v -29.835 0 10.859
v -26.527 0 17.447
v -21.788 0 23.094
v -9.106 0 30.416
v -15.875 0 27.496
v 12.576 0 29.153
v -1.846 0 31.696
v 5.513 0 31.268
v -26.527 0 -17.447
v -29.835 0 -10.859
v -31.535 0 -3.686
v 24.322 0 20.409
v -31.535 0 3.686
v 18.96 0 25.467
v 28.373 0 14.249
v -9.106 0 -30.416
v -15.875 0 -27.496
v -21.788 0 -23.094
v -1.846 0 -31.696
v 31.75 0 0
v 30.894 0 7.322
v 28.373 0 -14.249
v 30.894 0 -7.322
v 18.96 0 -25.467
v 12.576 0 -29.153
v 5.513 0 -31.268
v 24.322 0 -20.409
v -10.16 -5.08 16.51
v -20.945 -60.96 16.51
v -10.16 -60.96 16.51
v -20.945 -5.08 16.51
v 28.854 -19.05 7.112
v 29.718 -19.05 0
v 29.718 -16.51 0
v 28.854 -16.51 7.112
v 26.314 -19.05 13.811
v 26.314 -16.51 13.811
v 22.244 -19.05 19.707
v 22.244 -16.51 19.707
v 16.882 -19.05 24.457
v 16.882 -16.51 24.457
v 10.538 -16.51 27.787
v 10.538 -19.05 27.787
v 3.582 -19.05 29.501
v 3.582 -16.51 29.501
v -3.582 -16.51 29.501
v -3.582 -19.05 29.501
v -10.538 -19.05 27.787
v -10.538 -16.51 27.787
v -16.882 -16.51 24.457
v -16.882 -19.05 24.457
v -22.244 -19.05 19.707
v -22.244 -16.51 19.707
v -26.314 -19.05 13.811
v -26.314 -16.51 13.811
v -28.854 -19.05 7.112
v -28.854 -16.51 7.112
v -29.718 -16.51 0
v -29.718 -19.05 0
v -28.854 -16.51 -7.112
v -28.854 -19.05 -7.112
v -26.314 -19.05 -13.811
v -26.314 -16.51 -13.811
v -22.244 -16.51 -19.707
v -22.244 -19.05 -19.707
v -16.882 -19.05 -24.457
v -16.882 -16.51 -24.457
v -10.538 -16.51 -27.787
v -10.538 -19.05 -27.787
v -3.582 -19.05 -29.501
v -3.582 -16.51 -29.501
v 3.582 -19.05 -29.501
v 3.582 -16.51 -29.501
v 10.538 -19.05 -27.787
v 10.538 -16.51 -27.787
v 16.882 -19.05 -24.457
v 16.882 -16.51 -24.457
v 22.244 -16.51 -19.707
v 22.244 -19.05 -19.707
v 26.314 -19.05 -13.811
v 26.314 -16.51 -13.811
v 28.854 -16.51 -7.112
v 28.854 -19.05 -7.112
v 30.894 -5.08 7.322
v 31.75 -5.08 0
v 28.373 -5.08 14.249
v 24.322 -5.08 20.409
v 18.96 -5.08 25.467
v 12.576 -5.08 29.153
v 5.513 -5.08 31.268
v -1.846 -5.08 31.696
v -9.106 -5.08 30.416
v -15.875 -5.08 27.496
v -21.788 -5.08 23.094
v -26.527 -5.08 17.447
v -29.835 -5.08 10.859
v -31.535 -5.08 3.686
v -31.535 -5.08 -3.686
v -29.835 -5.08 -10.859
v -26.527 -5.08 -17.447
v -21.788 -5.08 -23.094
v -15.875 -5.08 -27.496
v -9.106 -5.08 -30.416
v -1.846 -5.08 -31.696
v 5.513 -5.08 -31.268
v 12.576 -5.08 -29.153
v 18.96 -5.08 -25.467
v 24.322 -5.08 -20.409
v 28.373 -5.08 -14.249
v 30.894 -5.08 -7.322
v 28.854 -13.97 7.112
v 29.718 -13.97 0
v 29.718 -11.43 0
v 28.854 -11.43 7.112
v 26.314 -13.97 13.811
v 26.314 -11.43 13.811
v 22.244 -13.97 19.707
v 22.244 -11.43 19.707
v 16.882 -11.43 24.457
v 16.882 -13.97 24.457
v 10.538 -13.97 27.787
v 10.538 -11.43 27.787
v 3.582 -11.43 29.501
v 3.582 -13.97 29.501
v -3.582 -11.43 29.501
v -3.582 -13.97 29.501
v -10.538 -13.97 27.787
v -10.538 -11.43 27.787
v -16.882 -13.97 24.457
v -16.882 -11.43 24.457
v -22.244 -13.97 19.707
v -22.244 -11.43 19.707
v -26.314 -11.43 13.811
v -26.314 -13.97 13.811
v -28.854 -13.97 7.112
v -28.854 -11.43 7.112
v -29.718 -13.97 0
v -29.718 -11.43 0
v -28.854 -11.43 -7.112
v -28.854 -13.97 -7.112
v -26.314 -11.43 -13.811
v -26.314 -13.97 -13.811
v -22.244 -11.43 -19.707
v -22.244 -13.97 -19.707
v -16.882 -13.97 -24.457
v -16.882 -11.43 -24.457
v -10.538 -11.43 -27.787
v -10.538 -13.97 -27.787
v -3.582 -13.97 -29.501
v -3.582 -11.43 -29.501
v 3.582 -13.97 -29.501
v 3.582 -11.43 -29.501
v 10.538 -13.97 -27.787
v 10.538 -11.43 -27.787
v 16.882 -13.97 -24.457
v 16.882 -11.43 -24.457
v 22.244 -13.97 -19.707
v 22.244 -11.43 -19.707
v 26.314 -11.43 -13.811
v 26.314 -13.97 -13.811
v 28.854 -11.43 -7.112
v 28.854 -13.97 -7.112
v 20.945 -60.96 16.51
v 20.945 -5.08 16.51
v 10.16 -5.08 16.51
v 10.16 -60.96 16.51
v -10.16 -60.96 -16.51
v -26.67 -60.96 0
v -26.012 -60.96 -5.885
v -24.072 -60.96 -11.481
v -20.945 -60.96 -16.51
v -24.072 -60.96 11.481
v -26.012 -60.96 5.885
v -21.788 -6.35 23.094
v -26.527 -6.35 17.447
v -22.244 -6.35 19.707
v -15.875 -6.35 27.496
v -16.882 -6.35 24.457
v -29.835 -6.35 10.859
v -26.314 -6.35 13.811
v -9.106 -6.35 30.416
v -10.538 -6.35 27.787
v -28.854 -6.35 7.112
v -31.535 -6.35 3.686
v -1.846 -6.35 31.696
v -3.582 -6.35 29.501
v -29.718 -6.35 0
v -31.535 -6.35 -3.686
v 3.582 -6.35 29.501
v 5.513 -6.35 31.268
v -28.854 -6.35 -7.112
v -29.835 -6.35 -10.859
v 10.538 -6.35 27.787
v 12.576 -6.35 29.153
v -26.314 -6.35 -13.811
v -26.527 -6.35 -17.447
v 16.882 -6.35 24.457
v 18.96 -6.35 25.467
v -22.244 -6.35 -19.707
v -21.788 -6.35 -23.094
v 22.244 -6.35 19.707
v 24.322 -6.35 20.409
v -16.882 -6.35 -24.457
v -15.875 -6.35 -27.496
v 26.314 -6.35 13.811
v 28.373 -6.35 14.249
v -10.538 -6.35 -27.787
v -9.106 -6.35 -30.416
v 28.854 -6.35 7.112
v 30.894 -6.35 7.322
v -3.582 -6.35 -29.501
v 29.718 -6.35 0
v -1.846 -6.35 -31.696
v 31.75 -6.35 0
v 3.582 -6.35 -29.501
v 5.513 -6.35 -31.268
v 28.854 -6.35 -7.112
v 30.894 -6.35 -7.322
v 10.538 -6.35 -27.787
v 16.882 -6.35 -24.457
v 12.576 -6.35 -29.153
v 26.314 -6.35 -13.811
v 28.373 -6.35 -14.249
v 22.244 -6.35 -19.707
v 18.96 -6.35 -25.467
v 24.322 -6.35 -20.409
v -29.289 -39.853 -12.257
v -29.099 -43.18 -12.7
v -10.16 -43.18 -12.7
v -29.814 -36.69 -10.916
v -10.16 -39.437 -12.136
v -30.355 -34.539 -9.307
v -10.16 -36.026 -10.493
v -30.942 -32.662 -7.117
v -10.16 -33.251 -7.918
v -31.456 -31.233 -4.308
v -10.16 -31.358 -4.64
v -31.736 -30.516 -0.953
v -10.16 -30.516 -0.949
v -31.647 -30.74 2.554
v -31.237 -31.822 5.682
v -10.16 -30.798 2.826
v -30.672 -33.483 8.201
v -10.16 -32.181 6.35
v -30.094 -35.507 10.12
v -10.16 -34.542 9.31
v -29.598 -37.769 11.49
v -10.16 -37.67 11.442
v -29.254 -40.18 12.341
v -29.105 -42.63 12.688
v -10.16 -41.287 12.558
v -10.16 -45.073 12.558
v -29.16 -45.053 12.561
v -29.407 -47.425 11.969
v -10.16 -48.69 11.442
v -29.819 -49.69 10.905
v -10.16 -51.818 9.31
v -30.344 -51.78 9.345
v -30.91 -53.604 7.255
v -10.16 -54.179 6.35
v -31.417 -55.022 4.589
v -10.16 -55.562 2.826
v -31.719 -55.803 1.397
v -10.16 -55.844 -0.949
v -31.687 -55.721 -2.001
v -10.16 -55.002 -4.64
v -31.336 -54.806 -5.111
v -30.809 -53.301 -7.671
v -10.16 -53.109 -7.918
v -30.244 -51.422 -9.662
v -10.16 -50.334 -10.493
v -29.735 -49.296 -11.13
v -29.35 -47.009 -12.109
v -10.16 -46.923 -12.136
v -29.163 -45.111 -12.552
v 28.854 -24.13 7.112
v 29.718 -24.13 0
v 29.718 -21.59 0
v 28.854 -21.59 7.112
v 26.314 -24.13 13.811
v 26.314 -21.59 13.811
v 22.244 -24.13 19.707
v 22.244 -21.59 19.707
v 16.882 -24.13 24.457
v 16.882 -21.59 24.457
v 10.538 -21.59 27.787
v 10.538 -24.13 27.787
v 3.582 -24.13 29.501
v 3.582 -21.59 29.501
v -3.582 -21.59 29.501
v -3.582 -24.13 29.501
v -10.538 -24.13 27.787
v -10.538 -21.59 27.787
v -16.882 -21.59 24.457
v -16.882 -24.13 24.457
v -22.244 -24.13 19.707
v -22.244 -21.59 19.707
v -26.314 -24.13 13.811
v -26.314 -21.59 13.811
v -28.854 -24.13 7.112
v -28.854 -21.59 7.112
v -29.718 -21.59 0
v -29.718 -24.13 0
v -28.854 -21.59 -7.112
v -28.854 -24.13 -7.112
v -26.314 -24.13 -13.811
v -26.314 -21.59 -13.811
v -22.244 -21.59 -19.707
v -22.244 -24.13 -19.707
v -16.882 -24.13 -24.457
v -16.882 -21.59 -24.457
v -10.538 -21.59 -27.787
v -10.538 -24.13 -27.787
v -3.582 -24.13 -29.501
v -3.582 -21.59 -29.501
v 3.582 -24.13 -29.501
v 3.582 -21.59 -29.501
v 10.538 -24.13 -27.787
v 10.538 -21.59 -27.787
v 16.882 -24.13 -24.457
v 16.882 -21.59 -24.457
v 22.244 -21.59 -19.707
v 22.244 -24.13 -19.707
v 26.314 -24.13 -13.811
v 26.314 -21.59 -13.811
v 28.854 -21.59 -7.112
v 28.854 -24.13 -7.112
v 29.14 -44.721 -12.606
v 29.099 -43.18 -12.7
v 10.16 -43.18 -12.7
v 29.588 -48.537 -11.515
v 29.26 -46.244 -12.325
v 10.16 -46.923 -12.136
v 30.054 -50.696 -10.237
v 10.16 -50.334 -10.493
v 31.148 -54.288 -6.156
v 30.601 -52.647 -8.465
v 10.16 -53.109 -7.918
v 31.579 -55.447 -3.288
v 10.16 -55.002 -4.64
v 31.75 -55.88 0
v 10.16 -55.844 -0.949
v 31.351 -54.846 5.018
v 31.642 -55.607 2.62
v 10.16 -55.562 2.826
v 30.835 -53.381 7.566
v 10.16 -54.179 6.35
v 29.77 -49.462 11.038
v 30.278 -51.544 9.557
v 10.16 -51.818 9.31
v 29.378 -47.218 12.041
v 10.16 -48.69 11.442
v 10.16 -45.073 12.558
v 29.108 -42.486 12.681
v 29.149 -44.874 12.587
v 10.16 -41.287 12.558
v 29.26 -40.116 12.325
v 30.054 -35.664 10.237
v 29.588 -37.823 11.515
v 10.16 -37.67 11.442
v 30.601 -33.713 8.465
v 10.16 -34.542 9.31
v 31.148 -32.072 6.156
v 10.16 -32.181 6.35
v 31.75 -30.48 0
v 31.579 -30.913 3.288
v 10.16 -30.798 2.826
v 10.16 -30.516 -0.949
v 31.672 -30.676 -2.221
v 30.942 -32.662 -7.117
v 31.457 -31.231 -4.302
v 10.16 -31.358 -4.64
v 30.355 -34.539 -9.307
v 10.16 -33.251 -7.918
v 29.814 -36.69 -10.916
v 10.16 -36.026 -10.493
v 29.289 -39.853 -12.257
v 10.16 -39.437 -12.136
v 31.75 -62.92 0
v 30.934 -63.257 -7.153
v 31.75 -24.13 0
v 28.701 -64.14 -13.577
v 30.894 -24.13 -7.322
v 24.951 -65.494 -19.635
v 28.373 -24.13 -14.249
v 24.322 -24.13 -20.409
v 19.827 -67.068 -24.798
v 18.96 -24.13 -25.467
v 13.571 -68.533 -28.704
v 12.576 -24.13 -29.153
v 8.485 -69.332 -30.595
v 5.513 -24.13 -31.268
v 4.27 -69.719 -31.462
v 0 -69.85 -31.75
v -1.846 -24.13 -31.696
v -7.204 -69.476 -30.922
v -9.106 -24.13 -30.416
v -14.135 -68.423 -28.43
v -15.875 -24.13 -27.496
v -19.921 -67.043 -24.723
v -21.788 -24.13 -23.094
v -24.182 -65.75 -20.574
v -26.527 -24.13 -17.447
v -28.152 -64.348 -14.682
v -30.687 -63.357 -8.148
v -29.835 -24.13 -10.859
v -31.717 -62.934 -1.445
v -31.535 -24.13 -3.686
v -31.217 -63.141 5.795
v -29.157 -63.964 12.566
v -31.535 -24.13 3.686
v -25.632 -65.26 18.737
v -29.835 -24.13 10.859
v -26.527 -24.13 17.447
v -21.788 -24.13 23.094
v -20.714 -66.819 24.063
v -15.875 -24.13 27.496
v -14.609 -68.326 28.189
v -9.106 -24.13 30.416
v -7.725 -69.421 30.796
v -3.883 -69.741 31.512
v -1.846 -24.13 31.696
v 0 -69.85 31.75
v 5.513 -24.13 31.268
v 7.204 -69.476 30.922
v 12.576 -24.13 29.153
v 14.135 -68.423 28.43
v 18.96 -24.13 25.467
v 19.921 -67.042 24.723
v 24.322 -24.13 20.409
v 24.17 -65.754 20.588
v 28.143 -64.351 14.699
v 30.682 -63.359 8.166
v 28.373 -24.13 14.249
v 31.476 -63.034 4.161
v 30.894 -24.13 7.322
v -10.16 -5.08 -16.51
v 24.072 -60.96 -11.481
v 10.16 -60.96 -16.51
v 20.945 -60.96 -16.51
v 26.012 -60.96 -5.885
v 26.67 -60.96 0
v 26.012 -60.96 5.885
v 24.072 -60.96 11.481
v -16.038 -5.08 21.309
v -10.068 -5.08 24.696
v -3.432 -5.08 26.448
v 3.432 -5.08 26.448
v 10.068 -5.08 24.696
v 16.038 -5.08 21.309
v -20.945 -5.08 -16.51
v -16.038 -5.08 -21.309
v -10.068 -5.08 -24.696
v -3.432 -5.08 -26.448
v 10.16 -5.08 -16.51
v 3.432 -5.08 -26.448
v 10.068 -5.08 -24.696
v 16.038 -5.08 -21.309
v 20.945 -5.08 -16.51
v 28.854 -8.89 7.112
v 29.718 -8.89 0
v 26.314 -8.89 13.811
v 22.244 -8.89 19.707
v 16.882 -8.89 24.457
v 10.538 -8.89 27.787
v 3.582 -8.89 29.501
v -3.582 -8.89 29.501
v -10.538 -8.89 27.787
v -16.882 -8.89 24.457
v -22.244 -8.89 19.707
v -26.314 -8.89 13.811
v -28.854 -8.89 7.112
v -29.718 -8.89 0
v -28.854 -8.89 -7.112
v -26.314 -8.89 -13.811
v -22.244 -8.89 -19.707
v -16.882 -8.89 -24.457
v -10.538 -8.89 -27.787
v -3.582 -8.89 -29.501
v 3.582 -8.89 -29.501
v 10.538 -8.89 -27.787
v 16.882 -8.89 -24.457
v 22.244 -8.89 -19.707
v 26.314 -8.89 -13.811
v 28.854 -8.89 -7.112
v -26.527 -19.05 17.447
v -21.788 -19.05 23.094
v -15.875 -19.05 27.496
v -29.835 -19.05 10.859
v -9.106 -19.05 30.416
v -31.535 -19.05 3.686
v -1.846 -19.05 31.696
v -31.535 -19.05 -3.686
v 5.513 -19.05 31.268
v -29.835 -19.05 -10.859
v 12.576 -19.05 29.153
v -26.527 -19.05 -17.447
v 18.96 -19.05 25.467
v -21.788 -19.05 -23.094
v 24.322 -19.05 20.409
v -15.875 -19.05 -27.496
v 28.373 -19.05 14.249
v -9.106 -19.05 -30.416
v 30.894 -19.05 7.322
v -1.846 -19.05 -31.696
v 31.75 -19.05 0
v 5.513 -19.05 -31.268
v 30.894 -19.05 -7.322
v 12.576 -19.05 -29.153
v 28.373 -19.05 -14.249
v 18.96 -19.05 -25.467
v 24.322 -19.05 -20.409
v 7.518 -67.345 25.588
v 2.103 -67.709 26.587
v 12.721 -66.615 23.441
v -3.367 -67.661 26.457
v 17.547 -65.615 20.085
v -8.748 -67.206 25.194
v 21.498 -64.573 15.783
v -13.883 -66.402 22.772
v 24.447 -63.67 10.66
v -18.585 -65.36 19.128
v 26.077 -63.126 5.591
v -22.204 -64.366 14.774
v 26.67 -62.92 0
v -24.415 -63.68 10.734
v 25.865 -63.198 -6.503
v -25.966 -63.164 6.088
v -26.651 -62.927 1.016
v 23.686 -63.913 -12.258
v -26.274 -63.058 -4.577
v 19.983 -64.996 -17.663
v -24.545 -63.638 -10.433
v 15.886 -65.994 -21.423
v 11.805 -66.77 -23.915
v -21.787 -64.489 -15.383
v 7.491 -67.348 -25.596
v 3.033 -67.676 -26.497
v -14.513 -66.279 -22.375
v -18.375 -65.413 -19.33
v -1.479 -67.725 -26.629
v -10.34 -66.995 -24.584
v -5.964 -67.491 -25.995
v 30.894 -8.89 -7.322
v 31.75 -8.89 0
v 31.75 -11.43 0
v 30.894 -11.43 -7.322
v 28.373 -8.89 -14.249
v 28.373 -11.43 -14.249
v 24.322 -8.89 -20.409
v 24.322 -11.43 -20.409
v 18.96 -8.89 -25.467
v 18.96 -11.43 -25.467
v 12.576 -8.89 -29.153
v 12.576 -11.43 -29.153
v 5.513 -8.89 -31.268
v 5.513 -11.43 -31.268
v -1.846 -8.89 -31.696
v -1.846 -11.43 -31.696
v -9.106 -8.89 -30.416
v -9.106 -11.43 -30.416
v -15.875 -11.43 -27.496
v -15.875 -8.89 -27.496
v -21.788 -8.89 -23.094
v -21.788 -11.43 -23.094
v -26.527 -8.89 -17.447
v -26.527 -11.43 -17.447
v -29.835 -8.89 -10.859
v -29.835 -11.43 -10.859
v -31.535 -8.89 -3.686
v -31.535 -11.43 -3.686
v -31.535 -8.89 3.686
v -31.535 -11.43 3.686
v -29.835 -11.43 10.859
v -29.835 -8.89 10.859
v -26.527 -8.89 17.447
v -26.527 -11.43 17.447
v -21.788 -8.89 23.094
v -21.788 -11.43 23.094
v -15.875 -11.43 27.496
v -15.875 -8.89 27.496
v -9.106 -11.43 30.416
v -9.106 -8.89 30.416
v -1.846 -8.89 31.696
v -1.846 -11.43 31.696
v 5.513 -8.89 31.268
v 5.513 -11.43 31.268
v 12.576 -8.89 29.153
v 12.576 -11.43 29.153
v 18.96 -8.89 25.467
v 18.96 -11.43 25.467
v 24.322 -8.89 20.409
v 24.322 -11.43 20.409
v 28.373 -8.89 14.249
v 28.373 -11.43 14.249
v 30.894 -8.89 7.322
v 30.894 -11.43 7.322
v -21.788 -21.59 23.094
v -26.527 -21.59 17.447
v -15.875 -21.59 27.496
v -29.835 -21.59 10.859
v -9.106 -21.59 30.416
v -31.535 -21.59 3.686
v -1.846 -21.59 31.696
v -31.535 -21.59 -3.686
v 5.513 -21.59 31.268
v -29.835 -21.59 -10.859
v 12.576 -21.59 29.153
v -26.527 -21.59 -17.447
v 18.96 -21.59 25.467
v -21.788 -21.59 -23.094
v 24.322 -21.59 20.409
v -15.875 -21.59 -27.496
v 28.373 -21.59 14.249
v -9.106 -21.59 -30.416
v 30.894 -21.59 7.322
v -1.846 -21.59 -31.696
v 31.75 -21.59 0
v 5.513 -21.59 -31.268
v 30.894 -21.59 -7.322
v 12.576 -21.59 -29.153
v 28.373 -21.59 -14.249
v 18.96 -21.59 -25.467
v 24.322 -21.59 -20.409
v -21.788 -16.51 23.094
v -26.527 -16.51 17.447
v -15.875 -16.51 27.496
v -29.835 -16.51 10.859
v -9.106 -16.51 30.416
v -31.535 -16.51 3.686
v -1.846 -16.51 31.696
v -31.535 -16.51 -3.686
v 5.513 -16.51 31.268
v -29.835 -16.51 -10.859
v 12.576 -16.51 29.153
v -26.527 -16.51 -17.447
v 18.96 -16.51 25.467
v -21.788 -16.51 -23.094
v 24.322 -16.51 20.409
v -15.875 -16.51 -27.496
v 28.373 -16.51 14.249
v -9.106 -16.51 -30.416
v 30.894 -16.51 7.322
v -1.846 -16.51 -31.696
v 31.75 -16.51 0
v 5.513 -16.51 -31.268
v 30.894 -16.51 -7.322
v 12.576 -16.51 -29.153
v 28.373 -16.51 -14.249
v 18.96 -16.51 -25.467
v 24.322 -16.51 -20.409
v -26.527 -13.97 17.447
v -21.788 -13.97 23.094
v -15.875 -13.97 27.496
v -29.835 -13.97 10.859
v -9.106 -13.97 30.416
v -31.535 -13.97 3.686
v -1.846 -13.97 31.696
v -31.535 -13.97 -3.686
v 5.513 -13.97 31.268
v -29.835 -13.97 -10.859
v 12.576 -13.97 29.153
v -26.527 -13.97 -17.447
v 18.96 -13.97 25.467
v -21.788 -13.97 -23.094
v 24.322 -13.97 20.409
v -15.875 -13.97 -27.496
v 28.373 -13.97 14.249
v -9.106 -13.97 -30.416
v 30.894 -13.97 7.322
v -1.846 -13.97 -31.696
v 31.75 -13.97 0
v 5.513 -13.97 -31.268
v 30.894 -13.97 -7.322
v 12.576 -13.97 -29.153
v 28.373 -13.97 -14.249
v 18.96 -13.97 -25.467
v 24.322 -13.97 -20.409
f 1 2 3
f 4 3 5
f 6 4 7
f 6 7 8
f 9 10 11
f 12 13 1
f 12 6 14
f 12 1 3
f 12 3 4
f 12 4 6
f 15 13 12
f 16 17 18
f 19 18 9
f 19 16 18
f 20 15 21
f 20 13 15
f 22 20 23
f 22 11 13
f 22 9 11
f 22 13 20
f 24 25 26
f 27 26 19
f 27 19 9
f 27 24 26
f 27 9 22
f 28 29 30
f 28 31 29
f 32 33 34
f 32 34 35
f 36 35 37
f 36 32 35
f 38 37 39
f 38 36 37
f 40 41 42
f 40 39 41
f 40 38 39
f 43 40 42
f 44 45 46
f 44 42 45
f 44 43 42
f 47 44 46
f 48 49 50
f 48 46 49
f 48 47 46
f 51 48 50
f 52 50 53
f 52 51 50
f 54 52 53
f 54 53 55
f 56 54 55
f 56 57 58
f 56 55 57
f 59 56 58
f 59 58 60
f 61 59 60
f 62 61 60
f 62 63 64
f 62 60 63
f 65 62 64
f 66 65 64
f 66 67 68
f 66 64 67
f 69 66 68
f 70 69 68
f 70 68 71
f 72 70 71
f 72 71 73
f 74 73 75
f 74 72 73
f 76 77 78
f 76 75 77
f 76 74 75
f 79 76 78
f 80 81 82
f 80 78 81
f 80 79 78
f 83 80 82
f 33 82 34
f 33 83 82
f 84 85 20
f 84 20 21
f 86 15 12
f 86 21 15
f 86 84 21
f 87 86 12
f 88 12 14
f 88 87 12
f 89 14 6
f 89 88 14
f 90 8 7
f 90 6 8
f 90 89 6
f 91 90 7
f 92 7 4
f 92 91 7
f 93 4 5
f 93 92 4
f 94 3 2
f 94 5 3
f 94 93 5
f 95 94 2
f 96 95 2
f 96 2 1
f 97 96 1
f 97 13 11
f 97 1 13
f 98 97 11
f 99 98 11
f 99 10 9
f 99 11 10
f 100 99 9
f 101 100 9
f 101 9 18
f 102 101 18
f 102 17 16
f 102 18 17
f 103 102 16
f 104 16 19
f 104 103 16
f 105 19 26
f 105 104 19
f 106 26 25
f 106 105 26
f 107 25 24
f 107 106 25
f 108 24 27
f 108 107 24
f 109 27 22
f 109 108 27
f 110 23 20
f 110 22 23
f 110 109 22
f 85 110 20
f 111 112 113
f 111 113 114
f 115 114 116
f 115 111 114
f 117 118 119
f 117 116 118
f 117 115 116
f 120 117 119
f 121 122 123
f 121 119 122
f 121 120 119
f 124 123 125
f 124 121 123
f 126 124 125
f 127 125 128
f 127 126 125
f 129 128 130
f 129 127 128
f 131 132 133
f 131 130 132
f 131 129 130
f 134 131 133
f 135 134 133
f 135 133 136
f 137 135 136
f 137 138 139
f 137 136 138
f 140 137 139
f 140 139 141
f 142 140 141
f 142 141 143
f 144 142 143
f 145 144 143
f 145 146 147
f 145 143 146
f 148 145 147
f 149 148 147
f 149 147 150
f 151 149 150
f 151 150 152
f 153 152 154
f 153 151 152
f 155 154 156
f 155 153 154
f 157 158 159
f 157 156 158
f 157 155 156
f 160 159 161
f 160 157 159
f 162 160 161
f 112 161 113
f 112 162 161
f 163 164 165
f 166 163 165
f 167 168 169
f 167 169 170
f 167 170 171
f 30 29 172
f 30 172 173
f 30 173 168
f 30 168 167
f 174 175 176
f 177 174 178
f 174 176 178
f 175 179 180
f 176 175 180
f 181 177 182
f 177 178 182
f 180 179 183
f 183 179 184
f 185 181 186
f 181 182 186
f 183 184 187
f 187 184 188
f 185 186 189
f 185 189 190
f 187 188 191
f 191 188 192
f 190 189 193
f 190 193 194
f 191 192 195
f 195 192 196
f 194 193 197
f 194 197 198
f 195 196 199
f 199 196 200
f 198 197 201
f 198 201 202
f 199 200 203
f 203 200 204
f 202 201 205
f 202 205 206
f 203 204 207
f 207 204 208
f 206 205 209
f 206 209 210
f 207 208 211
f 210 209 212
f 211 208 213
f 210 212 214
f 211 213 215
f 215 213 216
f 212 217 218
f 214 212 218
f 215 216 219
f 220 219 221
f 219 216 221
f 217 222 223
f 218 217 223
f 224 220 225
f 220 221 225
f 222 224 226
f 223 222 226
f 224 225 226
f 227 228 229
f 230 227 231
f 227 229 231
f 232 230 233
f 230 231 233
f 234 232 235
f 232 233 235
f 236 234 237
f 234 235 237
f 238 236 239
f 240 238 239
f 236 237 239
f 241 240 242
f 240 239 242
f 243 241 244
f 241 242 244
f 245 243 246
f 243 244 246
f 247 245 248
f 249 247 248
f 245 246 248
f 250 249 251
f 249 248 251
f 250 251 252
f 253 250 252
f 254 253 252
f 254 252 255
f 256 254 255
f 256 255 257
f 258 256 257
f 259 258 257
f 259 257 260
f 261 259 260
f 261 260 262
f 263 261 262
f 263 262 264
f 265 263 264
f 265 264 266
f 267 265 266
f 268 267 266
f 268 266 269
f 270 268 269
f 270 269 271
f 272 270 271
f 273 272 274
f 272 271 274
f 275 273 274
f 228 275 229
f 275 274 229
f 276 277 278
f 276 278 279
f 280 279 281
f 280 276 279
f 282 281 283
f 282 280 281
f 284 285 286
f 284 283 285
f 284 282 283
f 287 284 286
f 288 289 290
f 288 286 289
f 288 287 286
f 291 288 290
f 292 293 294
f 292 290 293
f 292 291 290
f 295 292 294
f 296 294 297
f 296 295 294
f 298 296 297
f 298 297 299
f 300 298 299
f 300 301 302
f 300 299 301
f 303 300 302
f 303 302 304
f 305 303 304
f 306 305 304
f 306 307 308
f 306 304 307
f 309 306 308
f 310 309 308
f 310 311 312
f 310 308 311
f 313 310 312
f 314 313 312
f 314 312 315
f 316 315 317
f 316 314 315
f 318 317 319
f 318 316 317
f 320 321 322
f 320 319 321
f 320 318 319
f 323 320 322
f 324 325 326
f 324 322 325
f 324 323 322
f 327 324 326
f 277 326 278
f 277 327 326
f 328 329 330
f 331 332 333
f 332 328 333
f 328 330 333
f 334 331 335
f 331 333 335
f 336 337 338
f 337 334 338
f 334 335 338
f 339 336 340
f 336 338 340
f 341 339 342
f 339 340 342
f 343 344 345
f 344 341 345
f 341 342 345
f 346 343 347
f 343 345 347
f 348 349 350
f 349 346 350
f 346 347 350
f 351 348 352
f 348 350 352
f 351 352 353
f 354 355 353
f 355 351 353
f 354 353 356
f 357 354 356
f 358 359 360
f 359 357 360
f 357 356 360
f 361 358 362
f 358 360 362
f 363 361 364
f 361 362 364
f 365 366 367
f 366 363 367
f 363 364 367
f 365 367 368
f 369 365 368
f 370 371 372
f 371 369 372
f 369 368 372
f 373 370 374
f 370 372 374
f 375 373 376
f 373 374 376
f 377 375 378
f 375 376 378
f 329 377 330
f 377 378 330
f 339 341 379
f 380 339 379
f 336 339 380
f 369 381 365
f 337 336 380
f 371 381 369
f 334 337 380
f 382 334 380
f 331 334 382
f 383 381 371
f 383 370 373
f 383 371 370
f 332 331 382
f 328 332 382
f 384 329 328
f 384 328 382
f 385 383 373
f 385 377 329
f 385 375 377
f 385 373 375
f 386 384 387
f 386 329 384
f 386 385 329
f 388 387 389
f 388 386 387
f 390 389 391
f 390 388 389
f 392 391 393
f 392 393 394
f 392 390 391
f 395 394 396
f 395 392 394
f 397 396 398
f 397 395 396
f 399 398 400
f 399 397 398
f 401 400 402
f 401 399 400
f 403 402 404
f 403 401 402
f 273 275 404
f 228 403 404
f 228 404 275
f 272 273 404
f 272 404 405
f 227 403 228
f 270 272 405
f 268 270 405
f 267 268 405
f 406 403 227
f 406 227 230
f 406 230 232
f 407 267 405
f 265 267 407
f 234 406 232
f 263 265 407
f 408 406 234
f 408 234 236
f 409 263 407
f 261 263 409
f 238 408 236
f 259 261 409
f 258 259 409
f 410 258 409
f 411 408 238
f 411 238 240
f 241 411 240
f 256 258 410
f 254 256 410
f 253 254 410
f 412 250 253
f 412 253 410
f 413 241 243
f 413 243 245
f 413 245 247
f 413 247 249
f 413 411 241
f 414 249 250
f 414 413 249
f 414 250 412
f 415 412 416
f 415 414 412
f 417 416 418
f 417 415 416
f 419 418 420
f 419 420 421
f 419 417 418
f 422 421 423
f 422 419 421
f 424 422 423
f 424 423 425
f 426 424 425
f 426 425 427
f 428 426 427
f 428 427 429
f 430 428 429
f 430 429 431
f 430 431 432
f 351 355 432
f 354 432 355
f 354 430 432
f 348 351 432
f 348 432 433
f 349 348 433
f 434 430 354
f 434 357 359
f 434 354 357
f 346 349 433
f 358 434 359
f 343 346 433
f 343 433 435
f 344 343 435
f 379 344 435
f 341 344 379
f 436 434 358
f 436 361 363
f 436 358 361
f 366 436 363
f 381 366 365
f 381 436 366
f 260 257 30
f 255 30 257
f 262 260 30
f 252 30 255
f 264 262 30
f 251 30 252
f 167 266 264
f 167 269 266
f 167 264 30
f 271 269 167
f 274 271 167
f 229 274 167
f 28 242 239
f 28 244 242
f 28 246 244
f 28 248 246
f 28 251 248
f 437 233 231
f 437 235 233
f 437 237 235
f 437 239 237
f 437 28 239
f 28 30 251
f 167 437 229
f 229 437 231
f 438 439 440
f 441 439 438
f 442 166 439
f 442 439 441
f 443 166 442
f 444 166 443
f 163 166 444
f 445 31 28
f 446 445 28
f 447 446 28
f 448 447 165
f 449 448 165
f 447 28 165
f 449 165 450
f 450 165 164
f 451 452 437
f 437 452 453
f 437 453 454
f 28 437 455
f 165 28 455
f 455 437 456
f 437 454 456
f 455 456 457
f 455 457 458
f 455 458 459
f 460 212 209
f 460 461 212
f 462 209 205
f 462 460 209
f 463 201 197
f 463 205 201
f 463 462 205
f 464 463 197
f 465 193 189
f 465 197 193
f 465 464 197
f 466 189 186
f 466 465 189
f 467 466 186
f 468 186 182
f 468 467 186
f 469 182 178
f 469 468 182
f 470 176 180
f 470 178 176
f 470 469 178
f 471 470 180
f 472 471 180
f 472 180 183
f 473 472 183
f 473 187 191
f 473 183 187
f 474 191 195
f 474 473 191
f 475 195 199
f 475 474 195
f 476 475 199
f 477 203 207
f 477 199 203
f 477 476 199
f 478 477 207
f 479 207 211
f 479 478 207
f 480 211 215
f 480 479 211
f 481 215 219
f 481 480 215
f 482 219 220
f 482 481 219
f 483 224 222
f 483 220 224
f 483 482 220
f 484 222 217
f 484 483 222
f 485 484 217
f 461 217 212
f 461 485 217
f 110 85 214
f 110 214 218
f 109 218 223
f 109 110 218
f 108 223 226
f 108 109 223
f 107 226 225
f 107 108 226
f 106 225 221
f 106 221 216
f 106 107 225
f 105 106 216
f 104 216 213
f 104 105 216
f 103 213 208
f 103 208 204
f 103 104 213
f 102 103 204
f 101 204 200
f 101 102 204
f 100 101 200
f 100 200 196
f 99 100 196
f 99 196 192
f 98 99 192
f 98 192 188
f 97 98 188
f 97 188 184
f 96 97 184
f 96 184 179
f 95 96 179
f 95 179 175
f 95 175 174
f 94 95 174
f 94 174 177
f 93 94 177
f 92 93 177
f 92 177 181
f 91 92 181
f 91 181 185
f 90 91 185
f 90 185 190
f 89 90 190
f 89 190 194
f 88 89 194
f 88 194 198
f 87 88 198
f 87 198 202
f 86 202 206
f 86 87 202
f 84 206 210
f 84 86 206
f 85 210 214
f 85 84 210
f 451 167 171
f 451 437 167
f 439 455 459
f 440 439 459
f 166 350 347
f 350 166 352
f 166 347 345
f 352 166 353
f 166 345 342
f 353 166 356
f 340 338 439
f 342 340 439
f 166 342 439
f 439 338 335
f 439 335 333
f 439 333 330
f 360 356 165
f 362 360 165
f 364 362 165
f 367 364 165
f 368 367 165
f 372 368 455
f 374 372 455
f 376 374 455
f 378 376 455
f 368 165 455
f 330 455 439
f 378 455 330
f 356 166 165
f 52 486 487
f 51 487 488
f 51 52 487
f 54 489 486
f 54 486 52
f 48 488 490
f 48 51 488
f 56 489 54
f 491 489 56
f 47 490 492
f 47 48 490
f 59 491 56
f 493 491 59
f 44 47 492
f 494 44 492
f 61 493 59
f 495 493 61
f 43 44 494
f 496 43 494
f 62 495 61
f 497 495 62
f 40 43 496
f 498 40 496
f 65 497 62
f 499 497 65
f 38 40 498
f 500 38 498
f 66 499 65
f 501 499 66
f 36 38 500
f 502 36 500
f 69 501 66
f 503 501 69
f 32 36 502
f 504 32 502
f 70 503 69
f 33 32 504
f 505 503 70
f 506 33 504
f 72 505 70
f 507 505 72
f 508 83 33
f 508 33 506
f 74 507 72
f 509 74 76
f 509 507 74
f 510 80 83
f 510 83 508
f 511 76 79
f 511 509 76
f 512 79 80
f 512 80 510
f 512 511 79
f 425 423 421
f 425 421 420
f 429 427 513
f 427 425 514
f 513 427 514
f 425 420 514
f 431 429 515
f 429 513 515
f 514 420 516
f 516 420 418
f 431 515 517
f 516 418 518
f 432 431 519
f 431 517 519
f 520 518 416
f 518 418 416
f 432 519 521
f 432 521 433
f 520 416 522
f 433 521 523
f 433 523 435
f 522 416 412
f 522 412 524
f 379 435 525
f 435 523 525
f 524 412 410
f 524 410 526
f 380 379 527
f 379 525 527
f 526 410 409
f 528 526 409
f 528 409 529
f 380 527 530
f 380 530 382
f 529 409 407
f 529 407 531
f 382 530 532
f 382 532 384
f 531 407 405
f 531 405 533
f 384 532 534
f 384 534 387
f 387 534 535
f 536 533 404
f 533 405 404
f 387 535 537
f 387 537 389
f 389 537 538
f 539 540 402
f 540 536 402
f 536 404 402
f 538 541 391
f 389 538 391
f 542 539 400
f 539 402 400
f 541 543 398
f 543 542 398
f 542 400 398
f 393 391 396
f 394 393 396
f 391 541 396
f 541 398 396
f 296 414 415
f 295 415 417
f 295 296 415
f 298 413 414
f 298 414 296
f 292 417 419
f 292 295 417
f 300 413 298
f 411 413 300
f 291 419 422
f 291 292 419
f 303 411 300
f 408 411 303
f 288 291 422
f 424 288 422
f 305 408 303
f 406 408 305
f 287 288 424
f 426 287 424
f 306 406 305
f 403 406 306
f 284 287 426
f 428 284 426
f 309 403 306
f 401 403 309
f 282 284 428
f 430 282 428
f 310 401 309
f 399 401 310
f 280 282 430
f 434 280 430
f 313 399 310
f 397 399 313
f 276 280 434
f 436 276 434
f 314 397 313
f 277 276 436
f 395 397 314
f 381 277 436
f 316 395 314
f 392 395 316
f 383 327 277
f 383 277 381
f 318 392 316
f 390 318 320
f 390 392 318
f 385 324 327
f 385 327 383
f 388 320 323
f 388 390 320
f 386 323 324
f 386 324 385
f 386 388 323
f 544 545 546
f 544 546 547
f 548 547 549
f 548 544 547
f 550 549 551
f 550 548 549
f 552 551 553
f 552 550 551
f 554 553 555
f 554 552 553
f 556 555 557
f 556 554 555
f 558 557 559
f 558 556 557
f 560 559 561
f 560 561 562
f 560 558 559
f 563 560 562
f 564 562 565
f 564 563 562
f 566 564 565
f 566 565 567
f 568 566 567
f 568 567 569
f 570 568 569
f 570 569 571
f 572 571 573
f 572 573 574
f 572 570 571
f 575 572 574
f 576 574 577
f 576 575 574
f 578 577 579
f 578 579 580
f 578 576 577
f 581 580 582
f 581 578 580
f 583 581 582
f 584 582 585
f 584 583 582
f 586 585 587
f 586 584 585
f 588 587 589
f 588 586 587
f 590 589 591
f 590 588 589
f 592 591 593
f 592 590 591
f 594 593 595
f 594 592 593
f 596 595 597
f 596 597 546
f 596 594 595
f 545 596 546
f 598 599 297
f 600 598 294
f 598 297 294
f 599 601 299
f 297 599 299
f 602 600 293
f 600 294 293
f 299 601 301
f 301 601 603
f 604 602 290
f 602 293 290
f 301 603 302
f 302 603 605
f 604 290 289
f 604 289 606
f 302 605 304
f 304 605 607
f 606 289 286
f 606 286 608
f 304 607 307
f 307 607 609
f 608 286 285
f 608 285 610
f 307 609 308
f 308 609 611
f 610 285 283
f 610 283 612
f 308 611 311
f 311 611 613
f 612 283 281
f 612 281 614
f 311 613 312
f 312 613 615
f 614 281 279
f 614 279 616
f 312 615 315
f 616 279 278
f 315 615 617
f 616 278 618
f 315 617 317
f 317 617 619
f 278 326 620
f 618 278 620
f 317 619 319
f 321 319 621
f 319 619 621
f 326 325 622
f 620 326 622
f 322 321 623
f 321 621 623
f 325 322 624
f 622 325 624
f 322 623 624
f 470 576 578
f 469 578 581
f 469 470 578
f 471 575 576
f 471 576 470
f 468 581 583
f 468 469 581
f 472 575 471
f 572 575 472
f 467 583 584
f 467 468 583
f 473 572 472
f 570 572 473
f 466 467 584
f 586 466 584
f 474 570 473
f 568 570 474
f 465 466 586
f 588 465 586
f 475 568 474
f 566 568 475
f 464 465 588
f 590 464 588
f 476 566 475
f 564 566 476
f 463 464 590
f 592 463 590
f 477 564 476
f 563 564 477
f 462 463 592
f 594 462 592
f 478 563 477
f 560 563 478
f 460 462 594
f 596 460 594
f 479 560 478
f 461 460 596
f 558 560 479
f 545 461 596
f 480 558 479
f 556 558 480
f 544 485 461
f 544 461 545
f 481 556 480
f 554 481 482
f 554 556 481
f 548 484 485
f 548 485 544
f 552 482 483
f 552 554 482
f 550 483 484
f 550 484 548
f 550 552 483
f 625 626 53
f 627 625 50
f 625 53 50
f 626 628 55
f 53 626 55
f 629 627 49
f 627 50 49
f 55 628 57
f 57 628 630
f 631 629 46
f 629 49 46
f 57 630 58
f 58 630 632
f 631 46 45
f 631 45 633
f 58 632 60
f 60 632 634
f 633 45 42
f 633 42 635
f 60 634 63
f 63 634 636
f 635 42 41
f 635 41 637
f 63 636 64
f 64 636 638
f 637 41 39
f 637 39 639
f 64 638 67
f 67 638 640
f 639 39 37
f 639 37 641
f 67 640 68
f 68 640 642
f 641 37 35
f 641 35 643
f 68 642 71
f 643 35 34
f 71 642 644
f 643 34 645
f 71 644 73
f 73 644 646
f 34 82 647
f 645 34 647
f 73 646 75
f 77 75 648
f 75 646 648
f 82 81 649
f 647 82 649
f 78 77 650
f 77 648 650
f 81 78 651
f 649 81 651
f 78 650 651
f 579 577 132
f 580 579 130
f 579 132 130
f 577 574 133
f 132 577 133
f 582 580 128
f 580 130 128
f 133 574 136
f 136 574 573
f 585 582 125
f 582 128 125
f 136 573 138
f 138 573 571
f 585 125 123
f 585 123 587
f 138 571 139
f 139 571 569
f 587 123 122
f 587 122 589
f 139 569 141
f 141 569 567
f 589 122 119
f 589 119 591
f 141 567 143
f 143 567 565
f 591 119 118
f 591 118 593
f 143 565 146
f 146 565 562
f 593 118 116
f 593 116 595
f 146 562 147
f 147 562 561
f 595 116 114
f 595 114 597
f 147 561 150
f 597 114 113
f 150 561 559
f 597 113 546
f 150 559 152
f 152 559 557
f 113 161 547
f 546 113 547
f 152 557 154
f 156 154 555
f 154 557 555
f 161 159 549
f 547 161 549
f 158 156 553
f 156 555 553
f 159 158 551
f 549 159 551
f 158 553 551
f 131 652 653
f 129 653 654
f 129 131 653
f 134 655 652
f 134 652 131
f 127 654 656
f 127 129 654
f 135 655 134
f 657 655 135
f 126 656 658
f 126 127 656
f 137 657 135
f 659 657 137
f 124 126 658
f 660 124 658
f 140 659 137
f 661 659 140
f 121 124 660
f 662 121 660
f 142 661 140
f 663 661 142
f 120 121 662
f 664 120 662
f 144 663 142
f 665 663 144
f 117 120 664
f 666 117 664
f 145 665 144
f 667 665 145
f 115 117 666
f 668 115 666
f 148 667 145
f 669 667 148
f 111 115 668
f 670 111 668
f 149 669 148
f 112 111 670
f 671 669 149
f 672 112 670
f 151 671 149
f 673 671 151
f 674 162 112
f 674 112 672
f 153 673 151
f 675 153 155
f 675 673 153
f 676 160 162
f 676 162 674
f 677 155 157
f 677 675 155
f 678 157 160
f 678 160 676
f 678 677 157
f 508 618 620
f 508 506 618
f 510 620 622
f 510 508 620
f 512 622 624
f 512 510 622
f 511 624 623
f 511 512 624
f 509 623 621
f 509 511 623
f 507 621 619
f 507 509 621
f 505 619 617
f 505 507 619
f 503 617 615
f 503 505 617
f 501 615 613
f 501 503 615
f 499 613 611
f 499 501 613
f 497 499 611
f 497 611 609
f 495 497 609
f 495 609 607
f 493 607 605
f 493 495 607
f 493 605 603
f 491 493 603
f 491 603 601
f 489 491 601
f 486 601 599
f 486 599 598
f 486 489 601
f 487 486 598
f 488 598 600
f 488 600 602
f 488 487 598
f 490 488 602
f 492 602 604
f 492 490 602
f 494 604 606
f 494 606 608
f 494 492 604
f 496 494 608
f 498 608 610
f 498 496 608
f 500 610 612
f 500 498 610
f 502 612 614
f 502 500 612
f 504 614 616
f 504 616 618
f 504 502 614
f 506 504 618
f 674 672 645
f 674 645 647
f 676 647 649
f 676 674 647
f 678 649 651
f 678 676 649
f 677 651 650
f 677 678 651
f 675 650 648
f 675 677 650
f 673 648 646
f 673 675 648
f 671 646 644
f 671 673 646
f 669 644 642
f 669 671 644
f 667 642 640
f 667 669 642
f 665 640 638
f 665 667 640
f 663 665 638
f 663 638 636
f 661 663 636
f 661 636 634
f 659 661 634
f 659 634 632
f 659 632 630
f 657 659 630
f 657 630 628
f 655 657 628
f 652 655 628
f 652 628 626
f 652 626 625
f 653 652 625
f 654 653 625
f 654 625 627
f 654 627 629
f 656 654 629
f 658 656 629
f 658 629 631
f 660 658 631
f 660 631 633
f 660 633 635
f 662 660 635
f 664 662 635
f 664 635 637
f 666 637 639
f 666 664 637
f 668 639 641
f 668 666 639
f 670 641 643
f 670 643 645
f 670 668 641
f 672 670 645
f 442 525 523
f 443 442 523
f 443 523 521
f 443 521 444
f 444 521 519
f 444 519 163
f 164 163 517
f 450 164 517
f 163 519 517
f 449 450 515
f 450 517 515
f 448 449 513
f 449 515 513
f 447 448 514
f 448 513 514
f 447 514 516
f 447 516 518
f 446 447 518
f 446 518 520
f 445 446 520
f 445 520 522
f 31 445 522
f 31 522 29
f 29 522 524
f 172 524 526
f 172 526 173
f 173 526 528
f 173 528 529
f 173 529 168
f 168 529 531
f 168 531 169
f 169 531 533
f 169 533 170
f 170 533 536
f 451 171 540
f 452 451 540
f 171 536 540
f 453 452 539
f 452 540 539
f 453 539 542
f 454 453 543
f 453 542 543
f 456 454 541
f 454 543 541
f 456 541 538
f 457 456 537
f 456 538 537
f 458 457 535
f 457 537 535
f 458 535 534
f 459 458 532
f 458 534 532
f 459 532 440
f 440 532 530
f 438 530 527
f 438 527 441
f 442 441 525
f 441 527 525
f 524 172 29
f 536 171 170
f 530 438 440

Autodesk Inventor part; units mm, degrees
ref_plane "YZ Plane" through (0, 0, 0) normal (1, 0, 0) x (0, 1, 0)
ref_plane "XZ Plane" through (0, 0, 0) normal (0, 1, 0) x (-1, 0, 0)
ref_plane "XY Plane" through (0, 0, 0) normal (0, 0, 1) x (1, 0, 0)
sketch "Sketch1" plane through (0, 0, 0) normal (0, 0, 1) x (1, 0, 0)
  line L0 (0, 0) -> (31.75, 0)
  line L1 (31.75, 0) -> (31.75, -5.08)
  line L2 (31.75, -5.08) -> (0, -5.08)
  line L3 (0, -5.08) -> (0, 0)
  line L4 (31.75, -5.08) -> (26.67, -5.08)
  line L5 (26.67, -5.08) -> (26.67, -69.85)
  line L6 (26.67, -69.85) -> (31.75, -69.85)
  line L7 (31.75, -69.85) -> (31.75, -5.08)
  line L8 (0, 0) -> (0, 62.0882)
  line L9 (31.75, -6.35) -> (29.718, -6.35)
  line L10 (29.718, -6.35) -> (29.718, -8.89)
  line L11 (29.718, -8.89) -> (31.75, -8.89)
  line L12 (31.75, -8.89) -> (31.75, -6.35)
  line L13 (31.75, -11.43) -> (29.718, -11.43)
  line L14 (29.718, -11.43) -> (29.718, -13.97)
  line L15 (29.718, -13.97) -> (31.75, -13.97)
  line L16 (31.75, -13.97) -> (31.75, -11.43)
  line L17 (31.75, -16.51) -> (29.718, -16.51)
  line L18 (29.718, -16.51) -> (29.718, -19.05)
  line L19 (29.718, -19.05) -> (31.75, -19.05)
  line L20 (31.75, -19.05) -> (31.75, -16.51)
  line L21 (31.75, -21.59) -> (29.718, -21.59)
  line L22 (29.718, -21.59) -> (29.718, -24.13)
  line L23 (29.718, -24.13) -> (31.75, -24.13)
  line L24 (31.75, -24.13) -> (31.75, -21.59)
  line L25 (0, -96.2376) -> (0, 88.4758) projected
  dimension "d0" = 69.85
  dimension "d1" = 5.08
  dimension "d2" = 63.5
  dimension "d3" = 2.032
  dimension "d4" = 2.54
  dimension "d5" = 6.35
  dimension "d6" = 5.08
  dimension "d7" = 5.08
  dimension "d8" = 5.08
revolve "Revolution1" add sketch "Sketch1" angle 360 about axis through (0, -10, 0) along (0, 1, 0) contours L0 L1 L2 L3 | L7 L9 L10 L11 L13 L14 L15 L17 L18 L19 L21 L22 L23 L6 L5 L2
sketch "Sketch2" plane through (0, -5.08, 0) normal (0, -1, 0) x (1, 0, 0)
  circle A0 centre (0, 0) radius 26.67 projected
  line L0 (20.9454, 16.51) -> (10.16, 16.51)
  line L1 (10.16, 16.51) -> (10.16, -16.51)
  line L2 (10.16, -16.51) -> (20.9454, -16.51)
  line L3 (-20.9454, 16.51) -> (-10.16, 16.51)
  line L4 (-10.16, 16.51) -> (-10.16, -16.51)
  line L5 (-10.16, -16.51) -> (-20.9454, -16.51)
  dimension "d10" = 33.02
  dimension "d11" = 20.32
extrude "Extrusion1" add sketch "Sketch2" along normal blind 55.88 contours A0 L2 L1 L0 | L3 L4 L5 A0
sketch "Sketch3" plane through (-10.16, -5.08, 16.51) normal (1, 0, 0) x (0, 0, -1)
  circle A0 centre (16.51, -38.1) radius 12.7
  line L0 (48.26, 5.08) -> (-15.24, 5.08) projected
  point P0 (16.51, 5.08)
  dimension "d14" = 25.4
  dimension "d15" = 43.18
extrude "Extrusion2" cut sketch "Sketch3" along normal through all both and the other way through all
sketch "Sketch4" plane through (0, 0, 0) normal (1, 0, 0) x (0, 1, 0)
  line L0 (-69.85, -31.75) -> (-69.85, 31.75) projected
  arc A0 (-69.85, -31.75) -> (-69.85, 31.75) centre (-139.1203, 0) ccw
  point P0 (0, 0)
  dimension "d18" = 76.2
extrude "Extrusion3" cut sketch "Sketch4" along normal through all both and the other way through all
properties part number "piston"
